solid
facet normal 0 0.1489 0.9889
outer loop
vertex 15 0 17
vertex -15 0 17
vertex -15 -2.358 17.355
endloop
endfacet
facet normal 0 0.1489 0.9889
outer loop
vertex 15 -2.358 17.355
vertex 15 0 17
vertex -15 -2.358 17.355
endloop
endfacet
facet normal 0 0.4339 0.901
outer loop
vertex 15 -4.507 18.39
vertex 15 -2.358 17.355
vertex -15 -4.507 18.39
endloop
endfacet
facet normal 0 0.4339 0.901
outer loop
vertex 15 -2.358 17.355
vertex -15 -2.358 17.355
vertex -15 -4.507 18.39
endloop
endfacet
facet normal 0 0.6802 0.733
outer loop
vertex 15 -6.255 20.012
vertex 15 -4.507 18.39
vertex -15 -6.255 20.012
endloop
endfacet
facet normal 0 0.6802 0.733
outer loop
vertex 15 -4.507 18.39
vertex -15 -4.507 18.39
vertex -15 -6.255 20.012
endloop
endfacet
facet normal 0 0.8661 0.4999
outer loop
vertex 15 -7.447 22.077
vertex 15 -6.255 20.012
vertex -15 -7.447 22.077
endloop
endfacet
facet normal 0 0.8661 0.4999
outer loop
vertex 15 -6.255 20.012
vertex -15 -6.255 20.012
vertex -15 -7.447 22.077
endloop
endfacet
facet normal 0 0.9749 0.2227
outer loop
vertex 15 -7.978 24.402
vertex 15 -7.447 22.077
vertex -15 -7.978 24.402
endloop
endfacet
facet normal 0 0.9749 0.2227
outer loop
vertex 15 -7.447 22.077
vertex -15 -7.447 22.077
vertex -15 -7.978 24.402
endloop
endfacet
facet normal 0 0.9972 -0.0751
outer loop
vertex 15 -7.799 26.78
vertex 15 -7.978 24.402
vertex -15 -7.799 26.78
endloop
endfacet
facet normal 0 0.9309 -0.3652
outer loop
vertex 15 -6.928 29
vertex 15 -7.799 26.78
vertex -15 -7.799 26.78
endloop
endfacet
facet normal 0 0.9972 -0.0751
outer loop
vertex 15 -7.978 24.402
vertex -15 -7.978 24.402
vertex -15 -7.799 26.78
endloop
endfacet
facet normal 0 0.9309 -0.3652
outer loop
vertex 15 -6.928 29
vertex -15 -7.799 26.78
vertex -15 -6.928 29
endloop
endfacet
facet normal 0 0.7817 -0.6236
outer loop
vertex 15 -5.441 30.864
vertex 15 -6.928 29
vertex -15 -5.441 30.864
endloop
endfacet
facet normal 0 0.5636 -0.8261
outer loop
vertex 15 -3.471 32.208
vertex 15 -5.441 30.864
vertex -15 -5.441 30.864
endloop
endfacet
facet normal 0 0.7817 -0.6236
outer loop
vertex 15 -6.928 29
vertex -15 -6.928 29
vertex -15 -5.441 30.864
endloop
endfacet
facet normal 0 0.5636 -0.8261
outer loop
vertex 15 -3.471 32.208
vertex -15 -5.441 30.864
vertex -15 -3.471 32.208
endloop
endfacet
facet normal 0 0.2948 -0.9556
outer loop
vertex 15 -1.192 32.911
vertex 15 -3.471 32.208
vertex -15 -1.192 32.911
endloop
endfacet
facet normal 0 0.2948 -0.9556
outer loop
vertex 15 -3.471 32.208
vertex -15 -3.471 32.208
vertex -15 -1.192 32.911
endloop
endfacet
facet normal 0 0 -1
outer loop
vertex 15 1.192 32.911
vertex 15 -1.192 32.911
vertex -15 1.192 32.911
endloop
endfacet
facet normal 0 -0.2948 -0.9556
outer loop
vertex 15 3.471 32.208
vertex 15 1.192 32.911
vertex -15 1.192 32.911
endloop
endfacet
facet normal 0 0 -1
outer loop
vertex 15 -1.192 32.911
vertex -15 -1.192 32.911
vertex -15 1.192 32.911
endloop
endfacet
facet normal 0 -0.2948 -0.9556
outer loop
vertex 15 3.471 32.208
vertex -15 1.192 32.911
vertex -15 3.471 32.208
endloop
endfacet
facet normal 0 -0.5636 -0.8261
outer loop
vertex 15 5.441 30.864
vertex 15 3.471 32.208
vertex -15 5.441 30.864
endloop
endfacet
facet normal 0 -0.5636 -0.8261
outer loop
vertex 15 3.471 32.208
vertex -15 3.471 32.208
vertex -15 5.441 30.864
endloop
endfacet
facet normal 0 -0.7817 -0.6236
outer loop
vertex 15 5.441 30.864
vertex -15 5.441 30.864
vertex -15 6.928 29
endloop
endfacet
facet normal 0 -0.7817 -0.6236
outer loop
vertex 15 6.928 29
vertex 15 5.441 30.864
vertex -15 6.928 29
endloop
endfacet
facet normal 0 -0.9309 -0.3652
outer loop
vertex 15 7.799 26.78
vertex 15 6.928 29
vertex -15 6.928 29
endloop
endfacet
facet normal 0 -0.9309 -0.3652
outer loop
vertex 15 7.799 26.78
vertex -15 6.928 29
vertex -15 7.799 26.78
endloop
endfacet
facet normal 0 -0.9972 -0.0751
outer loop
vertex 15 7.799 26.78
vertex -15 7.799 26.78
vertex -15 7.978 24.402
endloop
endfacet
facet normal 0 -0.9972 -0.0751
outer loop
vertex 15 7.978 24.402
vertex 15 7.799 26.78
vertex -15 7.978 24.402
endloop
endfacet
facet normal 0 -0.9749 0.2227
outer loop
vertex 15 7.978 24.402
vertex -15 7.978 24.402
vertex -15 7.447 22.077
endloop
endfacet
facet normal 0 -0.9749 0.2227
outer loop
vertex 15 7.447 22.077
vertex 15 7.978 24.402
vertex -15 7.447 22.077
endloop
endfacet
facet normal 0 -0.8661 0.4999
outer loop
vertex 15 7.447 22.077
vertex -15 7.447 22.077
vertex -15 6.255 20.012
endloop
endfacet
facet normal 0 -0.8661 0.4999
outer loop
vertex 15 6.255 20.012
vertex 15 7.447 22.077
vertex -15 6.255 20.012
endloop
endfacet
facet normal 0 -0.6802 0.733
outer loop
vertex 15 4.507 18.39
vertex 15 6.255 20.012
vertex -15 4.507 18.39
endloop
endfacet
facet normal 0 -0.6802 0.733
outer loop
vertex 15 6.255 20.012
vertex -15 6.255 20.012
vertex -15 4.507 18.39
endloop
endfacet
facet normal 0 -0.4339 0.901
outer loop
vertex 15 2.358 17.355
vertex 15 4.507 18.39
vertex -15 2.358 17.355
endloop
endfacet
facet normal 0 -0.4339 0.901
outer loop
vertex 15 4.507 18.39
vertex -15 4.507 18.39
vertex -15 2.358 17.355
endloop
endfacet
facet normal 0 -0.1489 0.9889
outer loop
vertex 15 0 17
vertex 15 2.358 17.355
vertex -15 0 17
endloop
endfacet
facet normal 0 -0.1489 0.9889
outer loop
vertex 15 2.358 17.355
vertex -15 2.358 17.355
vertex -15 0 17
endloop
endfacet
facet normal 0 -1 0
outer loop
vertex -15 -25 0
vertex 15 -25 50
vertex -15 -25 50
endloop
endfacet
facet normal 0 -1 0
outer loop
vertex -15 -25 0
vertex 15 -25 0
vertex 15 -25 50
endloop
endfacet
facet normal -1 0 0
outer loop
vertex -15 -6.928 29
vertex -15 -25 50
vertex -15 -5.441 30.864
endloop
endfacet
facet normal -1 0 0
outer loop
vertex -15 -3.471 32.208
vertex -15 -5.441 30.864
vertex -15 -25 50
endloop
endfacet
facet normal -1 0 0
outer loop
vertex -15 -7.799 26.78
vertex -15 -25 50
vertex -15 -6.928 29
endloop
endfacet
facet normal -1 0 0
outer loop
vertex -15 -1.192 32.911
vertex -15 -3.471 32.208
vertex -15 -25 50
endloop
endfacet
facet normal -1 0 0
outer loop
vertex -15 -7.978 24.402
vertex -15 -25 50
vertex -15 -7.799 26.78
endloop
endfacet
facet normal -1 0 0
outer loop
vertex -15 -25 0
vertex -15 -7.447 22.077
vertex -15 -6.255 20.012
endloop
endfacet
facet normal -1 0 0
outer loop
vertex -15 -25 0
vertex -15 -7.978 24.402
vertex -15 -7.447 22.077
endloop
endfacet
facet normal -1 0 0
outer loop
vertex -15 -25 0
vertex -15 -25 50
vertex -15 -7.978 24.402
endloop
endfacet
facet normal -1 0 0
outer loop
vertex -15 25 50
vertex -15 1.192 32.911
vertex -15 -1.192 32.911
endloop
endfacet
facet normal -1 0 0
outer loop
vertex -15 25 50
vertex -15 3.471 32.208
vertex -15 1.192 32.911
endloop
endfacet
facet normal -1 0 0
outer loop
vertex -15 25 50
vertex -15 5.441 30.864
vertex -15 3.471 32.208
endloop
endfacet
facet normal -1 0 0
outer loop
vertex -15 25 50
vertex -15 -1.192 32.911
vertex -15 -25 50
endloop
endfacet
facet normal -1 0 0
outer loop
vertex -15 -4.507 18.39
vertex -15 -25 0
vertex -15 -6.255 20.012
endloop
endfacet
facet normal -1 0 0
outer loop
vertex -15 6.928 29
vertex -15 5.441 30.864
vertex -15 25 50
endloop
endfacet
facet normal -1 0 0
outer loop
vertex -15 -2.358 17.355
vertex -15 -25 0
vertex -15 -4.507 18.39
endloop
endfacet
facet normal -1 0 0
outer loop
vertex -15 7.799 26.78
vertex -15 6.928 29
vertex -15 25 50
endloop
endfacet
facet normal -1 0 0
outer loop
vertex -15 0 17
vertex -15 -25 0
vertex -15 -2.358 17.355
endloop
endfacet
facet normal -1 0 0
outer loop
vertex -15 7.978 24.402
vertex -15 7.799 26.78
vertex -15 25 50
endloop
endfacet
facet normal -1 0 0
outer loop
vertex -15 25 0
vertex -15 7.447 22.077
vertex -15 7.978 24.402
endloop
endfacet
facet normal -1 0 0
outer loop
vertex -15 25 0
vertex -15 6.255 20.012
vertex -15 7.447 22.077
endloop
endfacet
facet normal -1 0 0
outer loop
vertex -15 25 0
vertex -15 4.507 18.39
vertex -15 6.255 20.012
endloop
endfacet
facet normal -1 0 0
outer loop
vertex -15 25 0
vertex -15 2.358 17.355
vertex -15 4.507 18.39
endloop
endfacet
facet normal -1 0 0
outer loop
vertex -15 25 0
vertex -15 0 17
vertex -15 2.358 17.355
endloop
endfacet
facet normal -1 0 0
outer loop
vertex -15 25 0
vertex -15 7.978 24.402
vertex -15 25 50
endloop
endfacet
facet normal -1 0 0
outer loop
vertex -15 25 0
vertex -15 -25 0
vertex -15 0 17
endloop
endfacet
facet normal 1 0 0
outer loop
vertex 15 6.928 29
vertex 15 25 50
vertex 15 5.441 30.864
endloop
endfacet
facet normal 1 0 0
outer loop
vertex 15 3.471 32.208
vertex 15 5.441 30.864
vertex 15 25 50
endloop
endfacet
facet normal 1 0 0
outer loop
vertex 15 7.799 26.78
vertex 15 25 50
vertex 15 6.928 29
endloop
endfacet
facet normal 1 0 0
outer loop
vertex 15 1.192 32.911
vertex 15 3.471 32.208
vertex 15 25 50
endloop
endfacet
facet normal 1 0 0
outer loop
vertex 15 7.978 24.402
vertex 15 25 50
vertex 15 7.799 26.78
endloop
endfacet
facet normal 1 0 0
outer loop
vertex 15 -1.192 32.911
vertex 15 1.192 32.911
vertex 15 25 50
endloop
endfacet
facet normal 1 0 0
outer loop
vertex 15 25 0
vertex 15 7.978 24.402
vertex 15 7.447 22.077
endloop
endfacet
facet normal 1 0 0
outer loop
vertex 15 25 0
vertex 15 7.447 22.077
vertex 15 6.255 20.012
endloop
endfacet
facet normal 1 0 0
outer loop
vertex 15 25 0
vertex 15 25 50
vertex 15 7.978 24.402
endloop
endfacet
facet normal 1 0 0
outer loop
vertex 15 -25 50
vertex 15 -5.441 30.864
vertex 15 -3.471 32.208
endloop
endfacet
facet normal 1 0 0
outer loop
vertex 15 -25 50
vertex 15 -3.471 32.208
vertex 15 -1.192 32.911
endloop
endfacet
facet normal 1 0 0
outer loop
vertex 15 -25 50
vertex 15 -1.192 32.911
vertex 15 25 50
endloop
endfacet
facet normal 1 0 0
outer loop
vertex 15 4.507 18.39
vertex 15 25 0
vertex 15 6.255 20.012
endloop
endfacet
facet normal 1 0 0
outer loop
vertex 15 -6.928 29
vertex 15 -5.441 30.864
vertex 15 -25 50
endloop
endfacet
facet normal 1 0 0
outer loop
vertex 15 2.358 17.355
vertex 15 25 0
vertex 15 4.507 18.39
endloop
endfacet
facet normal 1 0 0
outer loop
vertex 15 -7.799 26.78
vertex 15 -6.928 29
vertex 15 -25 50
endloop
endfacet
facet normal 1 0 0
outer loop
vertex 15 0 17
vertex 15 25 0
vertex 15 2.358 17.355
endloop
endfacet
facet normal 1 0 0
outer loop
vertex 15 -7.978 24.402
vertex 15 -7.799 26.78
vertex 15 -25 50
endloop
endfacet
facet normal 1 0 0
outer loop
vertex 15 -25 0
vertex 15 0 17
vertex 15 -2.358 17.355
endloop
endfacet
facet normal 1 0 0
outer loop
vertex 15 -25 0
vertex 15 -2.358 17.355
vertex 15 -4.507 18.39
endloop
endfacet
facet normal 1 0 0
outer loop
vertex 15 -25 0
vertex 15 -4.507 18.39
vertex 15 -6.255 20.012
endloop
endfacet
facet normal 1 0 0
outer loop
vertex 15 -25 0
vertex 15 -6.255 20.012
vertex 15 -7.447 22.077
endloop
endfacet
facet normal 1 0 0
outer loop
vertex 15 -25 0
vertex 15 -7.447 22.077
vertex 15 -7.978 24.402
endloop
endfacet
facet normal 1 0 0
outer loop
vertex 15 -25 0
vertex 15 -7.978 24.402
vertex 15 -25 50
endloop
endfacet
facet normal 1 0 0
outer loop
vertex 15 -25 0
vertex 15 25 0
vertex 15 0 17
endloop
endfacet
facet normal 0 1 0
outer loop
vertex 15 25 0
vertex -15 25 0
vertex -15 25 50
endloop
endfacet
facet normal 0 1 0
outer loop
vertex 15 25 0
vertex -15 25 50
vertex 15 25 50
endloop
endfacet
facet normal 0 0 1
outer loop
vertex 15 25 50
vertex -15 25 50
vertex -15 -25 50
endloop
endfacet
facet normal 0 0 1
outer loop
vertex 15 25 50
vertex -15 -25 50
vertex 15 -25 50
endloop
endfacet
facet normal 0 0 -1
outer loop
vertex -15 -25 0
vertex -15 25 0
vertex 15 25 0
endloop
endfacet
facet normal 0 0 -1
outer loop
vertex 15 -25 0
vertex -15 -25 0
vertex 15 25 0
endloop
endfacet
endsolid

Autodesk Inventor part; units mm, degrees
ref_plane "YZ Plane" through (0, 0, 0) normal (1, 0, 0) x (0, 1, 0)
ref_plane "Startebene" through (0, 0, 0) normal (0, 0, 1) x (1, 0, 0)
ref_plane "Endebene" through (0, 0, 50) normal (0, 0, 1) x (1, 0, 0)
sketch "Skizze" plane through (0, 0, 0) normal (0, 0, 1) x (1, 0, 0)
  line L0 (15, -25) -> (-15, -25)
  line L1 (-15, -25) -> (-15, 25)
  line L2 (-15, 25) -> (15, 25)
  line L3 (15, 25) -> (15, -25)
  line L4 (-6, 0) -> (8, 0) construction
  line L5 (0, -30) -> (0, 40) construction
  line L6 (0, 54) -> (0, -44) construction
  line L7 (-9.2, 0) -> (13.2, 0) construction
  dimension "d0" = 50
  dimension "d1" = 30
  dimension "d4" = 15
  dimension "d5" = 25
extrude "Körper" add sketch "Skizze" along normal up to surface (50 mm away) from surface at 0
sketch "Sketch3" plane through (0, 0, 0) normal (0, 0, 1) x (1, 0, 0)
  line L0 (0, 0) -> (10, 0)
ref_plane "Work Plane3" through (0, 0, 0) normal (0, -1, 0) x (1, 0, 0)
sketch "Sketch4" plane through (0, 0, 0) normal (0, -1, 0) x (1, 0, 0)
  line L0 (-2, 0) -> (12, 0)
  line L1 (-2, 50) -> (12, 50)
  dimension "d9" = 50
sketch "Skizze5" plane through (15, -25, 50) normal (1, 0, 0) x (0, 0, -1)
  line L0 (0, 50) -> (0, 0) projected
  line L1 (50, 0) -> (0, 0) projected
  point P0 (50, 25)
  point P1 (25, 25)
  dimension "d10" = 25
  dimension "d11" = 25
hole "Bohrung1" at (15, 0, 25) direction (-1, 0, 0) diameter 16 end through all
equation "\"d0\" = G_W"
equation "\"d1\" = G_H"
equation "\"d4\" = 0.5 * d1"
equation "\"d5\" = 0.5 * d0"
equation "\"d2\" = G_L"
equation "\"G_W\" = 50"
equation "\"G_H\" = 30"
equation "\"G_L\" = d9"
equation "\"G_OFFSET_START\" = 0"
equation "\"G_OFFSET_END\" = 0"
properties part number "EN 10058 - 50 x 30 - 50" material "Stahl, weich"
